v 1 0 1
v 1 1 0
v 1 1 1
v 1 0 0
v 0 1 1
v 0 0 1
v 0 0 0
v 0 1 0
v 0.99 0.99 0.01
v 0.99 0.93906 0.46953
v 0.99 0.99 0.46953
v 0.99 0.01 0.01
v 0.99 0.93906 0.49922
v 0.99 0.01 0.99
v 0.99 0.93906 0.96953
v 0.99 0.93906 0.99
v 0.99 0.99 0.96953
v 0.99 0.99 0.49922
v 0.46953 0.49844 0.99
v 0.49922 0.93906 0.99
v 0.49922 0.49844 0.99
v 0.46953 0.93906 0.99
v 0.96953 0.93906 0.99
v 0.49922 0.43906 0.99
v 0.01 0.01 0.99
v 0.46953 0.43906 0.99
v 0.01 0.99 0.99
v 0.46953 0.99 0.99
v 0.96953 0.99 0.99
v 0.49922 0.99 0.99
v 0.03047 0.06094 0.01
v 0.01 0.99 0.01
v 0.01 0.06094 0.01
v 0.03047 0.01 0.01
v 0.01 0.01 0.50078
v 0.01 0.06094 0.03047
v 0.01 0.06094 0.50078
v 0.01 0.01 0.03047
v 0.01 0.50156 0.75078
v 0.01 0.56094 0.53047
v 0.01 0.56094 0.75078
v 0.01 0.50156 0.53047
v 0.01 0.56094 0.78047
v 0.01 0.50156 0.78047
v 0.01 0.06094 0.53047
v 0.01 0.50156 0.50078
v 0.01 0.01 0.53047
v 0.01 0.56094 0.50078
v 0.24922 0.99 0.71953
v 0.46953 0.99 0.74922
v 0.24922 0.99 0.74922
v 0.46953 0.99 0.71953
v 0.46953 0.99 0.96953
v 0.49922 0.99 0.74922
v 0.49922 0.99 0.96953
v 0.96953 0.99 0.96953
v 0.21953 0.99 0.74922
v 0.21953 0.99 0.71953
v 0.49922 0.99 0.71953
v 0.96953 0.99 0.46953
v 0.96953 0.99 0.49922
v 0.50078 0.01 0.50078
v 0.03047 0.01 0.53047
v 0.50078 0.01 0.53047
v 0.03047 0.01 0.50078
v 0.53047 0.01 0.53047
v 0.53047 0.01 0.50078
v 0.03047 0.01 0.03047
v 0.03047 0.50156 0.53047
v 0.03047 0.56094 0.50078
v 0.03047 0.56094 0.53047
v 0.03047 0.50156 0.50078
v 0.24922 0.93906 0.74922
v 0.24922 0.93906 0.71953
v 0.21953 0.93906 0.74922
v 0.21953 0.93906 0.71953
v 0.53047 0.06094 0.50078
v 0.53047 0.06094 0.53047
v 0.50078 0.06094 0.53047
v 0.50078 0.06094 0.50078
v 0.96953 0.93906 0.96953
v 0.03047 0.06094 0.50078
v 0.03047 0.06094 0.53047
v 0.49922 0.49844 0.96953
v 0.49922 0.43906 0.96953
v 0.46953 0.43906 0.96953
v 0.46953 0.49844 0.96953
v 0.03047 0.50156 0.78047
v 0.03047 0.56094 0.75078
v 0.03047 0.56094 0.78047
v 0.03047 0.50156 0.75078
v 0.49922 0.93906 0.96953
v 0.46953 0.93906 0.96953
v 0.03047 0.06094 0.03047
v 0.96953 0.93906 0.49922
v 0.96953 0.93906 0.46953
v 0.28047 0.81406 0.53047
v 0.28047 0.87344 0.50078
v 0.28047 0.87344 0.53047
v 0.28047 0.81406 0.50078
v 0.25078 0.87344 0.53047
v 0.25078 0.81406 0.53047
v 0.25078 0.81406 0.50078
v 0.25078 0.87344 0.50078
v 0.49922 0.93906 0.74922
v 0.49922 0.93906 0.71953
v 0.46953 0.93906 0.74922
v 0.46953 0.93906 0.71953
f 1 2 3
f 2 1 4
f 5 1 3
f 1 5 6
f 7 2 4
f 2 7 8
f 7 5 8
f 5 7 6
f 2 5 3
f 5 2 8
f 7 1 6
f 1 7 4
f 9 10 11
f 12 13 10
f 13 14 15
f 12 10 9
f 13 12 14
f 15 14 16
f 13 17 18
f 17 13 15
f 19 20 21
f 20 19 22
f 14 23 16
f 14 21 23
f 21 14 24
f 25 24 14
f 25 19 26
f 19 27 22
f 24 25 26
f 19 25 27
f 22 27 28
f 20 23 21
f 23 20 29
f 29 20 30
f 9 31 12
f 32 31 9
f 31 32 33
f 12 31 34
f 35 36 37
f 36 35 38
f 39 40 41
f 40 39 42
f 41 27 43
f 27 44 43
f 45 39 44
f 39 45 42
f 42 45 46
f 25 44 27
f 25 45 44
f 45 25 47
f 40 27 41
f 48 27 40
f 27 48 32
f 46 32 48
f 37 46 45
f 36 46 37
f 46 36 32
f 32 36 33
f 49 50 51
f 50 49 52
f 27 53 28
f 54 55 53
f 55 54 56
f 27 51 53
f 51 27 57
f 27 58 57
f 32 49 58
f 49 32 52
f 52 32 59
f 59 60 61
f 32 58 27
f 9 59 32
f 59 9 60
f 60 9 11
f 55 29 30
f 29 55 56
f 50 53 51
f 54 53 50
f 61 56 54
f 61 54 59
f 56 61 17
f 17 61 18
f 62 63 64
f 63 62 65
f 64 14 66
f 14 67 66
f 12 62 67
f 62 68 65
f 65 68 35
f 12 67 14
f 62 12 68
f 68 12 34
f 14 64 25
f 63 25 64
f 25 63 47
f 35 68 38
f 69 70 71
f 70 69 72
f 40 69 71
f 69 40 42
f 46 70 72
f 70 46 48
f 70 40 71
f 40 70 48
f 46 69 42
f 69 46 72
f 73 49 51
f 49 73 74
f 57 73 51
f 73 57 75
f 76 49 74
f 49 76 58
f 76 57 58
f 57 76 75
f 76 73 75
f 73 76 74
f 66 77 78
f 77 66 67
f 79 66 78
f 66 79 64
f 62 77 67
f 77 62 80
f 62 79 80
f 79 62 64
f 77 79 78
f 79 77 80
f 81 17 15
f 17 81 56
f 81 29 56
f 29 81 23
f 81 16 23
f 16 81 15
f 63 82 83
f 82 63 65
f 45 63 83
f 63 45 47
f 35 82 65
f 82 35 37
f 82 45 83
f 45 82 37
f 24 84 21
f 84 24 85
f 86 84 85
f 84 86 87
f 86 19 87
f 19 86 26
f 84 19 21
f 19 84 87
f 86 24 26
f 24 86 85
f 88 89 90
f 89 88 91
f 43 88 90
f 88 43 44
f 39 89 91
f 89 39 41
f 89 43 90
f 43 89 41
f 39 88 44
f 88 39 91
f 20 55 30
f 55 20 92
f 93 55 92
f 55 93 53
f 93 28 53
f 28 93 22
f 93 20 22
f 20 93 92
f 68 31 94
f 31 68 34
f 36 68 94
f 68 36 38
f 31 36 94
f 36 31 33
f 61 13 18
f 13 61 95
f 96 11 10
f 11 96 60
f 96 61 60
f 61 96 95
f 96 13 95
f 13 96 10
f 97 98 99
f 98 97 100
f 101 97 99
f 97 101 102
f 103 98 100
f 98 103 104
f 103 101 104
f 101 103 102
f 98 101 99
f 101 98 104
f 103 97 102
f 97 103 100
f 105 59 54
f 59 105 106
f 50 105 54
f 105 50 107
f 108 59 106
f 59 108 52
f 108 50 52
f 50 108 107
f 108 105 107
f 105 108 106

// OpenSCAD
translate([0.015625, 0.53125, 0.515625]) color([0.6764002586894835, 0.49002609359593985, 0.6828992283474875]) cube([0.0296875, 0.059375, 0.0296875], center=true);
translate([0.234375, 0.96875, 0.734375]) color([0.9457740861038292, 0.48113916365283227, 0.11743485119222763]) cube([0.0296875, 0.059375, 0.0296875], center=true);
translate([0.515625, 0.03125, 0.515625]) color([0.6785611781392669, 0.3559530637070777, 0.24479389591231593]) cube([0.0296875, 0.059375, 0.0296875], center=true);
translate([0.984375, 0.96875, 0.984375]) color([0.19718264729666257, 0.5265513877214916, 0.7820972605832109]) cube([0.0296875, 0.059375, 0.0296875], center=true);
translate([0.015625, 0.03125, 0.515625]) color([0.016540899859545988, 0.2649906914184337, 0.6195666266963675]) cube([0.0296875, 0.059375, 0.0296875], center=true);
translate([0.484375, 0.46875, 0.984375]) color([0.9400622663204184, 0.8580807518186289, 0.33004078082379396]) cube([0.0296875, 0.059375, 0.0296875], center=true);
translate([0.015625, 0.53125, 0.765625]) color([0.9838273149753736, 0.1297919343219498, 0.6092048694604357]) cube([0.0296875, 0.059375, 0.0296875], center=true);
translate([0.484375, 0.96875, 0.984375]) color([0.4362496777237921, 0.204876863896859, 0.7703581377154641]) cube([0.0296875, 0.059375, 0.0296875], center=true);
translate([0.015625, 0.03125, 0.015625]) color([0.24016059236570497, 0.9925708955515705, 0.45030012798788]) cube([0.0296875, 0.059375, 0.0296875], center=true);
translate([0.984375, 0.96875, 0.484375]) color([0.6687095525163839, 0.6084946124880205, 0.9354113971140408]) cube([0.0296875, 0.059375, 0.0296875], center=true);
translate([0.265625, 0.84375, 0.515625]) color([0.40170597484563164, 0.9257642462472301, 0.7352475143256585]) cube([0.0296875, 0.059375, 0.0296875], center=true);
translate([0.484375, 0.96875, 0.734375]) color([0.9040805991886998, 0.8303556425691195, 0.04360117165228117]) cube([0.0296875, 0.059375, 0.0296875], center=true);
color([0.3,0.3,0.3,0.3]) difference() { cube([1,1,1]); translate([0.01,0.01,0.01]) cube([0.98,0.98,0.98]); }
